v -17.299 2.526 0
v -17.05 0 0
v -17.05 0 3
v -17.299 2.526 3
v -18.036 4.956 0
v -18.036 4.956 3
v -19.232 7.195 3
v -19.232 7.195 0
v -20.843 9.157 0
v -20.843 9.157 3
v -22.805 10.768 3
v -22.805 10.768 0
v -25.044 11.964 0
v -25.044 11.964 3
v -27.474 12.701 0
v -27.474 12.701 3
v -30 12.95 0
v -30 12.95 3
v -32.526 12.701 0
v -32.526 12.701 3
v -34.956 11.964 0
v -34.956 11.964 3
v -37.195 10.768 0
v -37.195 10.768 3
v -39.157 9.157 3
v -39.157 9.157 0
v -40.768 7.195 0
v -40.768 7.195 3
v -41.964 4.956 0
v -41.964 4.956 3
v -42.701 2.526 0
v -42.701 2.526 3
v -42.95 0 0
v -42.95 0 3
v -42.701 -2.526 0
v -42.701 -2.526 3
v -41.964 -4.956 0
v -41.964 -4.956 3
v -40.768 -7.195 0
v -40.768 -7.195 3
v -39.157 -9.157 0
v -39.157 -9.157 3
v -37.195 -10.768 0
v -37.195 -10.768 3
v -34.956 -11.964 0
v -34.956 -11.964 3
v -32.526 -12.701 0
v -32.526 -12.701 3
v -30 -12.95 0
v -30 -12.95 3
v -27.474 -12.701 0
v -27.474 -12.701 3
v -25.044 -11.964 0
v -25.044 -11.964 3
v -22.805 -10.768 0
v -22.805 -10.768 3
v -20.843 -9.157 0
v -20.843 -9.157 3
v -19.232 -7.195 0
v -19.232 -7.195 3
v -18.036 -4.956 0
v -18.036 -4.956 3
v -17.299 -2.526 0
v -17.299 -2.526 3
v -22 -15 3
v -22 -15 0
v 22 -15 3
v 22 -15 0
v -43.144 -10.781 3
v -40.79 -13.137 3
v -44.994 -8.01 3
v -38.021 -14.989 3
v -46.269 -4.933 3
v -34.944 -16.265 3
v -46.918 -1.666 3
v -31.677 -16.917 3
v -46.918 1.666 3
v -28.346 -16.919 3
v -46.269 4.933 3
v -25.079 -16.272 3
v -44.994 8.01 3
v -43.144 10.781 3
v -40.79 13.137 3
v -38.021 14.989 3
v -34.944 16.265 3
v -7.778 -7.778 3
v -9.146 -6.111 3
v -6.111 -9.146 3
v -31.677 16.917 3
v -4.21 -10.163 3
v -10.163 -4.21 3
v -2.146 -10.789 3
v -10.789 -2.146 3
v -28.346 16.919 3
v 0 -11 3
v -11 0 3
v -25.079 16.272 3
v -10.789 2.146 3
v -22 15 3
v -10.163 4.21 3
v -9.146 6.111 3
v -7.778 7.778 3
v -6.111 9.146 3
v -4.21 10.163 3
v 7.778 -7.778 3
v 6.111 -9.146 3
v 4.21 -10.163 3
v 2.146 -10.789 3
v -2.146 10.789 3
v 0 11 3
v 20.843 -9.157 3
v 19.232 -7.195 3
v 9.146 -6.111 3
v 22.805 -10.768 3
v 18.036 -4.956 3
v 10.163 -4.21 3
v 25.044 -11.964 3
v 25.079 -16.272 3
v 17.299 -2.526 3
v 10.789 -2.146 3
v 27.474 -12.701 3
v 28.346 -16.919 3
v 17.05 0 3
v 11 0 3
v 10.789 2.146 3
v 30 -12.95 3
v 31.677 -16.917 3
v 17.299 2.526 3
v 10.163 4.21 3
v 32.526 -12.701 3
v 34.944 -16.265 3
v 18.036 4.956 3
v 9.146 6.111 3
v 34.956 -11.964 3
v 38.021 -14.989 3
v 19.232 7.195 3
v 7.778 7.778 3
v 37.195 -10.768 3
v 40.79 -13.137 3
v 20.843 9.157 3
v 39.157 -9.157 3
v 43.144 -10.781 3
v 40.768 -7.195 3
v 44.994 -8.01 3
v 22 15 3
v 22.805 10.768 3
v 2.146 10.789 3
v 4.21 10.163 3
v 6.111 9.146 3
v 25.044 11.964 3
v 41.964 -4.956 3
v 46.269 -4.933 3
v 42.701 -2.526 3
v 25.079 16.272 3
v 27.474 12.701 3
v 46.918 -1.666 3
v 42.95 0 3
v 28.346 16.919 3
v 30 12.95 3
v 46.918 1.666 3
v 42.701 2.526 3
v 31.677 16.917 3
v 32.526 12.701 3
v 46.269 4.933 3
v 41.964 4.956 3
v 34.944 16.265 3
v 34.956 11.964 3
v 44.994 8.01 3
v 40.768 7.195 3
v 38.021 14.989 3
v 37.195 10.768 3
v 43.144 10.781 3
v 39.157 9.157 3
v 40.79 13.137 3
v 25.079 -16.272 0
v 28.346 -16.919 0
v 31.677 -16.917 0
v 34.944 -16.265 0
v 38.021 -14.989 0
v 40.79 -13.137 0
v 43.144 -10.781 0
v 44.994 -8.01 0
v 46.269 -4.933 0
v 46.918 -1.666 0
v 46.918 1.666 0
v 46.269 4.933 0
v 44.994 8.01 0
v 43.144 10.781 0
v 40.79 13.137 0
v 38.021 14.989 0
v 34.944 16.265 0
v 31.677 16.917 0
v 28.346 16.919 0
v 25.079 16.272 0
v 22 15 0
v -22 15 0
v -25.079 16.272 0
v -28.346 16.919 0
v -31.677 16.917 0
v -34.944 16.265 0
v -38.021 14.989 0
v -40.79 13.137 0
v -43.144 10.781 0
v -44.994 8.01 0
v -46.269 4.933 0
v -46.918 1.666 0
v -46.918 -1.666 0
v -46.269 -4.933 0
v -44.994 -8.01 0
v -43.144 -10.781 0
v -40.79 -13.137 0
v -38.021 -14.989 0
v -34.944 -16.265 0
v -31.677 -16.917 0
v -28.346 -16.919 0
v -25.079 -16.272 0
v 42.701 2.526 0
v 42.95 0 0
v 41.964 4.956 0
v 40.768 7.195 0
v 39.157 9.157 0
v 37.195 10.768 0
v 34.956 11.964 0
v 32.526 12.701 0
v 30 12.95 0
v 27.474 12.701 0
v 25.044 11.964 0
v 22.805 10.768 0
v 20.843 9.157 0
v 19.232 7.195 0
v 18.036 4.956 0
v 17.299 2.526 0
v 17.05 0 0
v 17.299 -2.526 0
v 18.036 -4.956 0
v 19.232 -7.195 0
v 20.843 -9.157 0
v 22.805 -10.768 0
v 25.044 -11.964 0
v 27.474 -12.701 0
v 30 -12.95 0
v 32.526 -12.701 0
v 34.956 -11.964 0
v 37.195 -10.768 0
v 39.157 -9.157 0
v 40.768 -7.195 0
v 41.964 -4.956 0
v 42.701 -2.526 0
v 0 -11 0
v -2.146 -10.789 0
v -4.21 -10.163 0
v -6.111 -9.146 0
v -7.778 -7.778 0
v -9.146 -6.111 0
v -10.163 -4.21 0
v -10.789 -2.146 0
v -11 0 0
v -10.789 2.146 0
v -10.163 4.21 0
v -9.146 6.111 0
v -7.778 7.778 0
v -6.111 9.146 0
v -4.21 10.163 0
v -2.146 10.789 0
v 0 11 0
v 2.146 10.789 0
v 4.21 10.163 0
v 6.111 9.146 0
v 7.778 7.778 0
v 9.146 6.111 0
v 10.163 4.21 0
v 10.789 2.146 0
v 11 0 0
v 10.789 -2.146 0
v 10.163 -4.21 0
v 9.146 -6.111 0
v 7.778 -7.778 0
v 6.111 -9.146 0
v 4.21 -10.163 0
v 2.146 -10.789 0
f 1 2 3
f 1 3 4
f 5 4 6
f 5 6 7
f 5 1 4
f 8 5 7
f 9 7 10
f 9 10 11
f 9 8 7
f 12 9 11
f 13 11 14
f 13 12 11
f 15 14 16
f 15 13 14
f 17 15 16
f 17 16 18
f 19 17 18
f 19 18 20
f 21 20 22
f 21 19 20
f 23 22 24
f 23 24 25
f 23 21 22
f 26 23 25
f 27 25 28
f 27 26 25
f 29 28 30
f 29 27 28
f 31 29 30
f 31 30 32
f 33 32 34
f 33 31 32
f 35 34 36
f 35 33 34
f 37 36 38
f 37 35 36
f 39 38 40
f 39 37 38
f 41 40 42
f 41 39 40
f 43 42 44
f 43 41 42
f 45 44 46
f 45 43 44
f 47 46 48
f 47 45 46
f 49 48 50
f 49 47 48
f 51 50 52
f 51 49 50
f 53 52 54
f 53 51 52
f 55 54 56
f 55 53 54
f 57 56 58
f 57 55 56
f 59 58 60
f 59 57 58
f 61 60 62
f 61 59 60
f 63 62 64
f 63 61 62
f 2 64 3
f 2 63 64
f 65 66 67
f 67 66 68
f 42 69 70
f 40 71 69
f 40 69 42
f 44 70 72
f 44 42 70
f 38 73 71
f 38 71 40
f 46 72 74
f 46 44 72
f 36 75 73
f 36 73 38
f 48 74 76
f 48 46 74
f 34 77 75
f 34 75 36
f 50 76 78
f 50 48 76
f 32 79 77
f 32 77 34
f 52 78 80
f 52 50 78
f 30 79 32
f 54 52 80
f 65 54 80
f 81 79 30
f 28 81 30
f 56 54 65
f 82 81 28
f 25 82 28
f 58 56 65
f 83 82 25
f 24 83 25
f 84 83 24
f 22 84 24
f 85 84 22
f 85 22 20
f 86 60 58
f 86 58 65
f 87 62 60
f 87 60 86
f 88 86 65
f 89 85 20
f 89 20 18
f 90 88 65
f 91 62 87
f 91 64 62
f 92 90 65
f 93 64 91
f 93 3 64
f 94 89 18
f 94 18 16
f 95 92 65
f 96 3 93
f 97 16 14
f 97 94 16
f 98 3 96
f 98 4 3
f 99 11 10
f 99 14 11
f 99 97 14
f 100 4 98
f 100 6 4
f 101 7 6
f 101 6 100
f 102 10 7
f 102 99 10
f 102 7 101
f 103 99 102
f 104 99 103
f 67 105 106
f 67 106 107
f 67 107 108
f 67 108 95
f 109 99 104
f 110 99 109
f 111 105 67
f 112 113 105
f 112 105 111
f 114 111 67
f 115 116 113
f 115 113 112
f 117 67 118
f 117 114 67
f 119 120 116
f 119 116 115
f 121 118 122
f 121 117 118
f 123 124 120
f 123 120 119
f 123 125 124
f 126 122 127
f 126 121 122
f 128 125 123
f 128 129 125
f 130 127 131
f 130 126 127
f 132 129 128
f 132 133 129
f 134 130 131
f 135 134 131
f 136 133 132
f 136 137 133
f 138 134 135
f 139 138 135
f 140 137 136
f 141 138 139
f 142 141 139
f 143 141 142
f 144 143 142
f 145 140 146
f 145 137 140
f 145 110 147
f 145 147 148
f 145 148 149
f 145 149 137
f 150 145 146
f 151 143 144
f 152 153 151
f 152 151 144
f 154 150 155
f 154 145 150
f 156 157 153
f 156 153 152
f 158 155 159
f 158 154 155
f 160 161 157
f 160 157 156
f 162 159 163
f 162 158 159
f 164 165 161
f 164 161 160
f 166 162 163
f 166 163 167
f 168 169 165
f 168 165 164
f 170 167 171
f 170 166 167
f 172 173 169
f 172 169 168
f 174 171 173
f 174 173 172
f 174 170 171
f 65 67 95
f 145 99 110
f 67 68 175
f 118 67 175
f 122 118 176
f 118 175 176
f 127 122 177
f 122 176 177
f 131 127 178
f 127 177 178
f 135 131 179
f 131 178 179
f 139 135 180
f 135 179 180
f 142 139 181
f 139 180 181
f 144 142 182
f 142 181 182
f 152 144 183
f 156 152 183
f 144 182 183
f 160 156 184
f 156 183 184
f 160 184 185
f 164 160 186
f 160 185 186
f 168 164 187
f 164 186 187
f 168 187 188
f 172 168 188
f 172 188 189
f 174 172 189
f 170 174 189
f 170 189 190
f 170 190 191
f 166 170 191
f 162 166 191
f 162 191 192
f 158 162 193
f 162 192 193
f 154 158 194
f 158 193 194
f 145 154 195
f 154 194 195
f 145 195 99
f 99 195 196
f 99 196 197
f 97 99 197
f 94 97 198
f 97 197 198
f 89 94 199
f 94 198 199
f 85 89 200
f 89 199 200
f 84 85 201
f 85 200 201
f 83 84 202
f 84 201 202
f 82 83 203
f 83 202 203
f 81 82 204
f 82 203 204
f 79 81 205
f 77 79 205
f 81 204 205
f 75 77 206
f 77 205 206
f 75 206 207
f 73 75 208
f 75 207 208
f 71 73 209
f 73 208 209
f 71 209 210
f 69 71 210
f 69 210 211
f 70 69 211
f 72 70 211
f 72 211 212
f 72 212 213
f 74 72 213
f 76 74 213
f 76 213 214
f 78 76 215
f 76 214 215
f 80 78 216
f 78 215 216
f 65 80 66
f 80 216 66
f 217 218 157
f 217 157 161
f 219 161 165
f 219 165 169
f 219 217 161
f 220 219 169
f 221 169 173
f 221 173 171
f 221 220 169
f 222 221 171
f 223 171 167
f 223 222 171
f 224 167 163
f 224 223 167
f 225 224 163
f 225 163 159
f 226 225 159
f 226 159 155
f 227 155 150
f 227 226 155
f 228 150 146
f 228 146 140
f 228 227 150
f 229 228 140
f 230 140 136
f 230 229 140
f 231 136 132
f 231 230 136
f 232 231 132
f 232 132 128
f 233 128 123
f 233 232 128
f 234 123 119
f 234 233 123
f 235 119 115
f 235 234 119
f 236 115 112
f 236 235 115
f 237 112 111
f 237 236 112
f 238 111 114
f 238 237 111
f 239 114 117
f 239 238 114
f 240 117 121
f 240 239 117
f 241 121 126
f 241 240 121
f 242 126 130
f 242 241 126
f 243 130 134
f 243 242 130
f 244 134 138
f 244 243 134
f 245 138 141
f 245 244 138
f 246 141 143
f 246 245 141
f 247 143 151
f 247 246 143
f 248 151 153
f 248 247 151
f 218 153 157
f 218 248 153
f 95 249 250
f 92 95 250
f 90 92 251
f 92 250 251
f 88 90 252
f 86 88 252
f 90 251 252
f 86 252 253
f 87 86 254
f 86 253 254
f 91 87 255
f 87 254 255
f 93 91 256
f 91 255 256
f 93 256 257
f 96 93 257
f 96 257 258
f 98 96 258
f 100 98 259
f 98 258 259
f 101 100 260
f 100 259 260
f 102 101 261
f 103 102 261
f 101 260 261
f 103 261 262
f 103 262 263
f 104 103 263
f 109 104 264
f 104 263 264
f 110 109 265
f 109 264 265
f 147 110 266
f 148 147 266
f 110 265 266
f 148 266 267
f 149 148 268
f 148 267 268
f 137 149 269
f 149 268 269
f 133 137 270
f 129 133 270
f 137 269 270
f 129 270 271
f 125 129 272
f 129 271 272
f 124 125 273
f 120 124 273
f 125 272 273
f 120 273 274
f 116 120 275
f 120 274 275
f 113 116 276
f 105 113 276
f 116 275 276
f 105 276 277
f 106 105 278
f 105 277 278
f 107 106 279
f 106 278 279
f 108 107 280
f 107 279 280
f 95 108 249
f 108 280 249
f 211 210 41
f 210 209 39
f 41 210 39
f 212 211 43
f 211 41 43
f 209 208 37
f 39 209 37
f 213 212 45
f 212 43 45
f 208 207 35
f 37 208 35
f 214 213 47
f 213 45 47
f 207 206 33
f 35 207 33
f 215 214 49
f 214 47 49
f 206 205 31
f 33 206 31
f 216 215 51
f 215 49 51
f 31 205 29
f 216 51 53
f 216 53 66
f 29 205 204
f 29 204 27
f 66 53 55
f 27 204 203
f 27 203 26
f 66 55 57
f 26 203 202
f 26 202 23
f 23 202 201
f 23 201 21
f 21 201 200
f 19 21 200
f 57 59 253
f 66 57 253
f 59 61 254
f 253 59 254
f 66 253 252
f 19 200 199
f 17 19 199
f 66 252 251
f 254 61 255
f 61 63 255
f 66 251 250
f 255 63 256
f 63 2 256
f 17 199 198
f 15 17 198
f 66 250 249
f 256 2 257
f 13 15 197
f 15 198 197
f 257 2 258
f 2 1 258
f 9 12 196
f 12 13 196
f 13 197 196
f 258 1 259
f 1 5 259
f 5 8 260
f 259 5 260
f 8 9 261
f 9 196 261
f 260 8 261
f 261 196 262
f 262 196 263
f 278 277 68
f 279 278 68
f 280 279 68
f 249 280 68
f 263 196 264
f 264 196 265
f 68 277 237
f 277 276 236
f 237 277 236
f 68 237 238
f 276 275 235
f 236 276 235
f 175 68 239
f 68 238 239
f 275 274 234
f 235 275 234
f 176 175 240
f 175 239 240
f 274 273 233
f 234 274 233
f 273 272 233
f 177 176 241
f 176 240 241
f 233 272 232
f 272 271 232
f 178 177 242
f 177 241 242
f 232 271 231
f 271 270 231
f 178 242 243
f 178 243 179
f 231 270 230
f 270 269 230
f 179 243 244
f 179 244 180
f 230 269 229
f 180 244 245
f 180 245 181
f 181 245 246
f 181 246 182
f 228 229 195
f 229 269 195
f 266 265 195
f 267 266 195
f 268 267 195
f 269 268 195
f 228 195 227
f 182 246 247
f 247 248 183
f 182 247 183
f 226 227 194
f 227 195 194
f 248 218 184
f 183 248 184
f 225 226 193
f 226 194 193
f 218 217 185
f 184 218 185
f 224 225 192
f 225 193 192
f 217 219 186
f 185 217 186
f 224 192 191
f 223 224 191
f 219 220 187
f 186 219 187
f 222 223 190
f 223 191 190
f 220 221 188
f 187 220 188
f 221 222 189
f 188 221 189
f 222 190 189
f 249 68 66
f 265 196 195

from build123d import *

# Parameters (mm, degrees)
F0_R     = 12.95
F1_DEPTH = 3


with BuildPart() as f1:
    # F0 (on Top) → F1 (new body)
    with BuildSketch(Plane.XY):
        with BuildLine():
            Line((-22, -15), (22, -15))
            ThreePointArc((22, -15), (47, 0), (22, 15))
            Line((22, 15), (-22, 15))
            ThreePointArc((-22, 15), (-47, 0), (-22, -15))
        make_face()
        with Locations((-30, 0)):
            Circle(F0_R, mode=Mode.SUBTRACT)
        with BuildLine():
            ThreePointArc((0, 11), (11, 0), (0, -11))
            ThreePointArc((0, -11), (-11, 0), (0, 11))
        make_face(mode=Mode.SUBTRACT)
        with Locations((30, 0)):
            Circle(F0_R, mode=Mode.SUBTRACT)
    extrude(amount=F1_DEPTH)


solid = f1.part
